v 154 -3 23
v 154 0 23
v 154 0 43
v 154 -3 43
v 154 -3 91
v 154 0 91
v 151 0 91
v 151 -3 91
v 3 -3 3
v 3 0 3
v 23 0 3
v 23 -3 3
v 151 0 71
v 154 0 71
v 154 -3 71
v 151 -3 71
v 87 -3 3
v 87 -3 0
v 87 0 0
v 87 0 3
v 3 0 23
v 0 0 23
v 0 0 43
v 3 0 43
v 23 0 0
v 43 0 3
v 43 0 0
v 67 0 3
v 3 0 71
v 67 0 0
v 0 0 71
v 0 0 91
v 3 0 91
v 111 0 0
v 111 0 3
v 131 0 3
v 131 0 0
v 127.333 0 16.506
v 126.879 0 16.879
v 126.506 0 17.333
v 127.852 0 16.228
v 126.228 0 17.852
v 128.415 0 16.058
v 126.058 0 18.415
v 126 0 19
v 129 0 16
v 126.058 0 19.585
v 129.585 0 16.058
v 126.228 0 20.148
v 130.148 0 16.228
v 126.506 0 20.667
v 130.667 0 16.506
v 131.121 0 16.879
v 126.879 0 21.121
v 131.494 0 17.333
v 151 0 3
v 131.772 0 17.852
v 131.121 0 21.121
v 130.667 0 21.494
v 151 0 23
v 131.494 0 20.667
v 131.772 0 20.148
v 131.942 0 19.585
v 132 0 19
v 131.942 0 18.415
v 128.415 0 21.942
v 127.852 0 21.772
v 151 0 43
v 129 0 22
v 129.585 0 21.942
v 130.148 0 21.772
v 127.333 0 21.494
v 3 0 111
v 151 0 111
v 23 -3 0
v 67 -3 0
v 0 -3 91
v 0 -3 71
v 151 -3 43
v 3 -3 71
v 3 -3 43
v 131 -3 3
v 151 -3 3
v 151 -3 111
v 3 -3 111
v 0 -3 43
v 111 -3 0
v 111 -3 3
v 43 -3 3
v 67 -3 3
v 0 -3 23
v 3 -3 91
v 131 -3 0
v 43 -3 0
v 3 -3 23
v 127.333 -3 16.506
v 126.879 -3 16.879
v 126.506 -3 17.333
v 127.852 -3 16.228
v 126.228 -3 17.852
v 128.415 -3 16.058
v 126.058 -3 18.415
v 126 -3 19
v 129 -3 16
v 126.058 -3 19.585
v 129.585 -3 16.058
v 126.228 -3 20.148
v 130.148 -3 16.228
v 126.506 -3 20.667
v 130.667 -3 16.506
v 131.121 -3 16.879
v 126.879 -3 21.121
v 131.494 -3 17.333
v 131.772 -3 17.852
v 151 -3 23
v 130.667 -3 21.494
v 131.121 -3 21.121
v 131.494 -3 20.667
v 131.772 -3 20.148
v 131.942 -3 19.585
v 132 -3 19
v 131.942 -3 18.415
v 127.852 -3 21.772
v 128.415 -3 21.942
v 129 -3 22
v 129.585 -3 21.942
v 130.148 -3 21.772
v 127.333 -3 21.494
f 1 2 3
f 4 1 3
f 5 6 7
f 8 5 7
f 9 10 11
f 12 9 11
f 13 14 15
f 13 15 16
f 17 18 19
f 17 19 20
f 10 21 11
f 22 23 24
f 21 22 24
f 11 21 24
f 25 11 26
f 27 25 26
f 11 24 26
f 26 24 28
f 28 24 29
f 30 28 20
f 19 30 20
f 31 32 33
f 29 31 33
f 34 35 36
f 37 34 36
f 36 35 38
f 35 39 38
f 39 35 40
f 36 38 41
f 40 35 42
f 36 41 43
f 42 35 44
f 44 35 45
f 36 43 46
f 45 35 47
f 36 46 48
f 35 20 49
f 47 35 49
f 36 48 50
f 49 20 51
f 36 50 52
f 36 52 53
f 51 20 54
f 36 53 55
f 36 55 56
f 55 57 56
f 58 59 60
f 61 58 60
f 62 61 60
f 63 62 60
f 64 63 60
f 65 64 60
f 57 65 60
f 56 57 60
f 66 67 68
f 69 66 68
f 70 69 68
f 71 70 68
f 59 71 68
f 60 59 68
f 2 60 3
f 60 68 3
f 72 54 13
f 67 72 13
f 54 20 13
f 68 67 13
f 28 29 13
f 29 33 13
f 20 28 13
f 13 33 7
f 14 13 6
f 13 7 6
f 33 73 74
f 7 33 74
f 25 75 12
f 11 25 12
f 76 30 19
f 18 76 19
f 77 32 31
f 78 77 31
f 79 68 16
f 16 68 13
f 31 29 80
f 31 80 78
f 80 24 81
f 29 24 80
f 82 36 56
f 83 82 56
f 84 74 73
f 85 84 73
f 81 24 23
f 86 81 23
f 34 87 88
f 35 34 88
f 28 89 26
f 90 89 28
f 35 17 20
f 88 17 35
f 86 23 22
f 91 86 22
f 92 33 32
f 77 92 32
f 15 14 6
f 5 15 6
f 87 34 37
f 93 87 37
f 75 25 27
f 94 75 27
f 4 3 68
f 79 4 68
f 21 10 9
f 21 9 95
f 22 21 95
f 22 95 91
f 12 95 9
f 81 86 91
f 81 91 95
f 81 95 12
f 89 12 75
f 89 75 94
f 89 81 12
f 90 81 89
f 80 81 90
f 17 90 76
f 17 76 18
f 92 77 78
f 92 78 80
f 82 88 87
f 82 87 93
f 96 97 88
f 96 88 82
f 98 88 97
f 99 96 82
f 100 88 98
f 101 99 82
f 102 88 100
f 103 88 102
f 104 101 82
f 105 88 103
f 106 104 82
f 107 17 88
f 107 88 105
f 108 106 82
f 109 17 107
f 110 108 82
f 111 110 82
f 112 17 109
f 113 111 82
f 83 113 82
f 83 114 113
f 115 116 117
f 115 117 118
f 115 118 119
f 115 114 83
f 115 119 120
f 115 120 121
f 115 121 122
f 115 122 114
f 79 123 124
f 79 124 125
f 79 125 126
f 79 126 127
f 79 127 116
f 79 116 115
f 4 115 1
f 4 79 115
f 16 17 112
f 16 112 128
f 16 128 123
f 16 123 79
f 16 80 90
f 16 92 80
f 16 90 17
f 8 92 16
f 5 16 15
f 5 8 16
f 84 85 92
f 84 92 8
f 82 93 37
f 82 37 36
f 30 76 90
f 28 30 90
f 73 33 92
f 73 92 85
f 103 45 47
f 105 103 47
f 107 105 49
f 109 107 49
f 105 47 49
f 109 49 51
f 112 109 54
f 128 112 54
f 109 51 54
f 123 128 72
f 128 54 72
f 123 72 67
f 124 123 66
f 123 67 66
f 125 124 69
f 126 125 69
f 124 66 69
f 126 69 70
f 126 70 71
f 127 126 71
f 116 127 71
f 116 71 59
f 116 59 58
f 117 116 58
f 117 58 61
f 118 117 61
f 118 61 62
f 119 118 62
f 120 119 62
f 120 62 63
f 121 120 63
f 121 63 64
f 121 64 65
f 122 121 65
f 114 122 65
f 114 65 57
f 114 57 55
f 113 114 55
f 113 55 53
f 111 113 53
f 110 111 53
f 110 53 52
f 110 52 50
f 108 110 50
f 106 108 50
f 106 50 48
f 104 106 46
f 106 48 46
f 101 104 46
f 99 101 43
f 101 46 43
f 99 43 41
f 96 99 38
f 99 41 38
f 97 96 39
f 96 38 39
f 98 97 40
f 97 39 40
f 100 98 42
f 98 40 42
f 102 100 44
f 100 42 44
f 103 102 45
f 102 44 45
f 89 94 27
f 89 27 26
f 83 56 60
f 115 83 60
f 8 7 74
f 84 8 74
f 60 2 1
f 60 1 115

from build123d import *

# Parameters (mm, degrees)
F1_DEPTH = 3
F2_W     = 20
F2_H     = 3
F2_W_2   = 24
F3_DEPTH = 3.001
F4_W     = 3
F4_H     = 20
F4_H_2   = 28
F5_DEPTH = 3.001
F6_R     = 3
F7_DEPTH = 3.001


with BuildPart() as f1:
    # F0 (on Front) → F1 (new body)
    with BuildSketch(Plane.XZ):
        Polygon((3, 3), (3, 0), (151, 0), (151, 3), (154, 3), (154, 111), (0, 111), (0, 3), align=None)
    extrude(amount=F1_DEPTH)

    # F2 (on face) → F3 (cut, through all)
    with BuildSketch(Plane.XZ.offset(3)):
        with Locations((13, 1.5)):
            Rectangle(F2_W, F2_H)
        with Locations((55, 1.5)):
            Rectangle(F2_W_2, F2_H)
        with Locations((141, 1.5)):
            Rectangle(F2_W, F2_H)
        with Locations((99, 1.5)):
            Rectangle(F2_W_2, F2_H)
    extrude(amount=-F3_DEPTH, mode=Mode.SUBTRACT)

    # F4 (on face) → F5 (cut, through all)
    with BuildSketch(Plane(origin=(0, 0, 0), x_dir=(-1, 0, 0), z_dir=(0, 1, 0))):
        with Locations((-152.5, 13)):
            Rectangle(F4_W, F4_H)
        with Locations((-152.5, 57)):
            Rectangle(F4_W, F4_H_2)
        with Locations((-152.5, 101)):
            Rectangle(F4_W, F4_H)
        with Locations((-1.5, 57)):
            Rectangle(F4_W, F4_H_2)
        with Locations((-1.5, 13)):
            Rectangle(F4_W, F4_H)
        with Locations((-1.5, 101)):
            Rectangle(F4_W, F4_H)
    extrude(amount=-F5_DEPTH, mode=Mode.SUBTRACT)

    # F6 (on face) → F7 (cut, through all)
    with BuildSketch(Plane(origin=(0, 0, 0), x_dir=(-1, 0, 0), z_dir=(0, 1, 0))):
        with Locations((-129, 19)):
            Circle(F6_R)
    extrude(amount=-F7_DEPTH, mode=Mode.SUBTRACT)


solid = f1.part
